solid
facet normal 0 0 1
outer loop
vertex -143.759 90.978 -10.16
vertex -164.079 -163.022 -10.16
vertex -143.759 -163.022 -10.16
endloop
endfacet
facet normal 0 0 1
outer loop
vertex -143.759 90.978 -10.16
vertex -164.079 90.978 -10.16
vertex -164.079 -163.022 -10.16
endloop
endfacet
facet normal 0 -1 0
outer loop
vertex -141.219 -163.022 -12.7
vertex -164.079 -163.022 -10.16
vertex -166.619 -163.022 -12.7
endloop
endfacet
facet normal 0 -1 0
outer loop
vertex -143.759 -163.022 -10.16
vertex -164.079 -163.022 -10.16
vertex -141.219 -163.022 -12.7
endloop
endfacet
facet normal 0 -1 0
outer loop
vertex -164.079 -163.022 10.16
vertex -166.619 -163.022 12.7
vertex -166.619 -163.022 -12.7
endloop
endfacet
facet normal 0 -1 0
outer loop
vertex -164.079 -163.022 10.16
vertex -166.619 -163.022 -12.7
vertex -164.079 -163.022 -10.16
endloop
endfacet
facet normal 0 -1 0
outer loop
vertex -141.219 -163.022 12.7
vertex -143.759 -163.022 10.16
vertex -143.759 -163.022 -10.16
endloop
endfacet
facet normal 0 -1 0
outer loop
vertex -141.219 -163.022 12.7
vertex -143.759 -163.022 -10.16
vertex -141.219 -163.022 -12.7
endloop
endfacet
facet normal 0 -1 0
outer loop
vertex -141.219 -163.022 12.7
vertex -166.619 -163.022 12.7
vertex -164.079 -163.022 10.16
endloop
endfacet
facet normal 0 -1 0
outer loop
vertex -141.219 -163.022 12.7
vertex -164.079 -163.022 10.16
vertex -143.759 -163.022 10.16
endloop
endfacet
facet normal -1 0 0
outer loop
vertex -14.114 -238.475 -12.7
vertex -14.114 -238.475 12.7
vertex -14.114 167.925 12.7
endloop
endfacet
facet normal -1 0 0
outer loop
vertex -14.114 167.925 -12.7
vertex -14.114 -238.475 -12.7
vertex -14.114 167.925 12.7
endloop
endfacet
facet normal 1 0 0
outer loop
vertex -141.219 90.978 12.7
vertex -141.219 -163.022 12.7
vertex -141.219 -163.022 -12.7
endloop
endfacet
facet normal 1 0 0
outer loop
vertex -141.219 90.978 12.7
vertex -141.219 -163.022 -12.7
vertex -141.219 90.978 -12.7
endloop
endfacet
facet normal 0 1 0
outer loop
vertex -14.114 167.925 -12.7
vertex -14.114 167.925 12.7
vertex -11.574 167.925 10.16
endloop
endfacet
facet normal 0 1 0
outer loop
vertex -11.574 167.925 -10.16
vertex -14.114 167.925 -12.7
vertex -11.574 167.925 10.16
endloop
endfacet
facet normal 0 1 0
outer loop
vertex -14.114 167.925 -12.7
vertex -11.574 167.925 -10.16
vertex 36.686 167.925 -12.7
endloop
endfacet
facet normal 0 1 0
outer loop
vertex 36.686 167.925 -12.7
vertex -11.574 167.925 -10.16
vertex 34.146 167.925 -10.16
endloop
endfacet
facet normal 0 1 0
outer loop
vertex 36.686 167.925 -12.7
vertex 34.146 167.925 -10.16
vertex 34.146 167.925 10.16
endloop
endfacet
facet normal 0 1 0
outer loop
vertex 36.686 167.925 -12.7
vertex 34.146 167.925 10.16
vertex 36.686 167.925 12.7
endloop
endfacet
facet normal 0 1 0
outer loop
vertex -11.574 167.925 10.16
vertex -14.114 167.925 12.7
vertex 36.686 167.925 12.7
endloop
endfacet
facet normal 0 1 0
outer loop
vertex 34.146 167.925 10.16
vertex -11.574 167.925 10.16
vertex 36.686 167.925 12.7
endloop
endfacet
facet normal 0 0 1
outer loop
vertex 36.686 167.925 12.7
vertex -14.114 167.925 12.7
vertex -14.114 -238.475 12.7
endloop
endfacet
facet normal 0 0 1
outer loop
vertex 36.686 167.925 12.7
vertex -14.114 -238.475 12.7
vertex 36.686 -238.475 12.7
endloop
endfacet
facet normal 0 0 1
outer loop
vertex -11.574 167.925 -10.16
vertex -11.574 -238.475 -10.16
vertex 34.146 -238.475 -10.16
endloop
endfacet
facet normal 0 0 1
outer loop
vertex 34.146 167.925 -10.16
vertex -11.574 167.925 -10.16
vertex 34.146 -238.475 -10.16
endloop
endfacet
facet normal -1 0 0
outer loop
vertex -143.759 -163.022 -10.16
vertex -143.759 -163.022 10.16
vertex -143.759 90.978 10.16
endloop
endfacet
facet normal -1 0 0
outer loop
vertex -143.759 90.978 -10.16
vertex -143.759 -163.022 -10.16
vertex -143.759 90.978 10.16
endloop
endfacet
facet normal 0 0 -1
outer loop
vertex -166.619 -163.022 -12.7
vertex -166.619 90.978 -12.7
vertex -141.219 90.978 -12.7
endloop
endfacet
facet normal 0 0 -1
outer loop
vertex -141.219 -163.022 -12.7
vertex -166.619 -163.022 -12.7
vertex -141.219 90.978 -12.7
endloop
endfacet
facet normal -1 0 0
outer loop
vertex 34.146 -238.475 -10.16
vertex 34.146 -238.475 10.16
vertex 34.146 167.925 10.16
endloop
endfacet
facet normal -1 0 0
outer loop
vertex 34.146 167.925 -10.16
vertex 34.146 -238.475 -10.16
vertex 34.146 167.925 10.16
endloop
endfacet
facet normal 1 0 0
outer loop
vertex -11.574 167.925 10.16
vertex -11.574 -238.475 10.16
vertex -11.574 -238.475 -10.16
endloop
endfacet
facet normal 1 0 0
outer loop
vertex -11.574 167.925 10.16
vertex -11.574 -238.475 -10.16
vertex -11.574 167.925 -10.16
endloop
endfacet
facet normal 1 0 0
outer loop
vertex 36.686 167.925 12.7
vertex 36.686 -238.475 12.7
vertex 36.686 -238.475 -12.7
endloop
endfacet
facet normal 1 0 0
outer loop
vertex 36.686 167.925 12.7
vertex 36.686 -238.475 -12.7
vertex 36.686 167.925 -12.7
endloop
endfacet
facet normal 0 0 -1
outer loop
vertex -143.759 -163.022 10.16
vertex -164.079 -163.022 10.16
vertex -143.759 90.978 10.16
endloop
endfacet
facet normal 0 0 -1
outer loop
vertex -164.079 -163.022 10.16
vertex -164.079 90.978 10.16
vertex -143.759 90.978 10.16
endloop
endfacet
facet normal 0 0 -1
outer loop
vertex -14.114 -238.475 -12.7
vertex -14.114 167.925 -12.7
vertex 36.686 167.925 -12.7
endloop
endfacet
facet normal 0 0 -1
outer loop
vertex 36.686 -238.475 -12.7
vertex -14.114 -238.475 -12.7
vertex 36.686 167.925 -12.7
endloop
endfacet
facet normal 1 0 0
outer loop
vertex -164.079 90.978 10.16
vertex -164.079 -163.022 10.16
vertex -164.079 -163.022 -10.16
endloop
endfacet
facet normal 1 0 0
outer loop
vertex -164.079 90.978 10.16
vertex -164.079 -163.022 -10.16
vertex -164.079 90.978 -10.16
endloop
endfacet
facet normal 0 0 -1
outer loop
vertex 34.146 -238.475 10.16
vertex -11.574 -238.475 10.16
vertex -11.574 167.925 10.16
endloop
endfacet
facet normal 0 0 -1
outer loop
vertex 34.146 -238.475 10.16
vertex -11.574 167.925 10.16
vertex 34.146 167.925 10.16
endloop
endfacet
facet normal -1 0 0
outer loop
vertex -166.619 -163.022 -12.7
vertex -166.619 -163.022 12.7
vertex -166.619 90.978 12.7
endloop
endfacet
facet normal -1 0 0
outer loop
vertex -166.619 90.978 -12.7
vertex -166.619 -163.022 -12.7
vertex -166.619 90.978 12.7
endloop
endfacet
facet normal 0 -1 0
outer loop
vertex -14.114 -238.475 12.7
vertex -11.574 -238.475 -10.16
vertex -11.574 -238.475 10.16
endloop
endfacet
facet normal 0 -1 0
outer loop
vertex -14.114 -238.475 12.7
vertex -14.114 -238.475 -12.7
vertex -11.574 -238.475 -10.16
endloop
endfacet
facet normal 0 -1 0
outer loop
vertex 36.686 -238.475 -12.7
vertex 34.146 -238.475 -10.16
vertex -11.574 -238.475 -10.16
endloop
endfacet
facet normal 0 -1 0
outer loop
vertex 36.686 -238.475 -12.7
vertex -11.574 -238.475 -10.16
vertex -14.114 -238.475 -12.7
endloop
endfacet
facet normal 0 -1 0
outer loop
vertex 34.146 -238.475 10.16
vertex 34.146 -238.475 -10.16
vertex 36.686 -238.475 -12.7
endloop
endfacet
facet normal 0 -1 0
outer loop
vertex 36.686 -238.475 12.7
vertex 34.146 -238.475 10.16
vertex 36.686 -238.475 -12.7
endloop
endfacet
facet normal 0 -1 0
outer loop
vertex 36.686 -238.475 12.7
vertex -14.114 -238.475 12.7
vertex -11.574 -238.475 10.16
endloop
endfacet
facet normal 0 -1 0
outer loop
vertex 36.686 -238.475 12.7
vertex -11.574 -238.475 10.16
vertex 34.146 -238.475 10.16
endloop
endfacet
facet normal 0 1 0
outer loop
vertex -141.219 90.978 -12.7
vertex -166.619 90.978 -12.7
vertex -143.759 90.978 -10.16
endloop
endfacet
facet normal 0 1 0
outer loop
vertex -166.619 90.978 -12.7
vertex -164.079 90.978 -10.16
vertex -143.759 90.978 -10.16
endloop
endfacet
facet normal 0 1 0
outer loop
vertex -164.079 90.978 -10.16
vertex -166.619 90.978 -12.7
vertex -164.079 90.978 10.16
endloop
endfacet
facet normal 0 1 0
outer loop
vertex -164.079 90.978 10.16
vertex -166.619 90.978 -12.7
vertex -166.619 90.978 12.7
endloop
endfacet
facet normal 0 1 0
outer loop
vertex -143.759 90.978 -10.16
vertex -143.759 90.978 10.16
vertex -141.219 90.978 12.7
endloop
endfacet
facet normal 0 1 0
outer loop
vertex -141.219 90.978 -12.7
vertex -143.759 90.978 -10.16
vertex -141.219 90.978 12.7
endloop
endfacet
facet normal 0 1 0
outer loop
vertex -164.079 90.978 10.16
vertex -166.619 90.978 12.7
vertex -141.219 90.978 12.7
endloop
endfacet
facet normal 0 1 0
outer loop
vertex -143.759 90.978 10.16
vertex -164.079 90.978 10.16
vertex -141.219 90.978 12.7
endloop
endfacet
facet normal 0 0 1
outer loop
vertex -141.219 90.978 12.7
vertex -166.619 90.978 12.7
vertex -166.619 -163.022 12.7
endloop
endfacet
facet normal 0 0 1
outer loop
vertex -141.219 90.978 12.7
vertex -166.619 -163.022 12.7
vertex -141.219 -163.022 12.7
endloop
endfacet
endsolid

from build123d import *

# Parameters (mm, degrees)
F0_W     = 50.8
F0_H     = 406.4
F1_DEPTH = 12.7
F2_T     = -2.54
F3_W     = 25.4
F3_H     = 254
F4_DEPTH = 12.7
F5_T     = -2.54


with BuildPart() as f1:
    # F0 (on Top) → F1 (new body, symmetric)
    with BuildSketch(Plane.XY):
        with Locations((11.285979, -35.275271)):
            Rectangle(F0_W, F0_H)
    extrude(amount=F1_DEPTH, both=True)

    # F2
    f2_openings = [f1.faces().sort_by_distance(p)[0] for p in [
        (11.285979, 167.924729, 0),
        (11.285979, -238.475271, 0),
    ]]
    offset(amount=F2_T, openings=f2_openings)


with BuildPart() as f4:
    # F3 (on Top) → F4 (new body, symmetric)
    with BuildSketch(Plane.XY):
        with Locations((-153.918764, -36.02155)):
            Rectangle(F3_W, F3_H)
    extrude(amount=F4_DEPTH, both=True)

    # F5
    f5_openings = [f4.faces().sort_by_distance(p)[0] for p in [
        (-153.918764, 90.97845, 0),
        (-153.918764, -163.02155, 0),
    ]]
    offset(amount=F5_T, openings=f5_openings)


solid = Compound([f1.part, f4.part])
